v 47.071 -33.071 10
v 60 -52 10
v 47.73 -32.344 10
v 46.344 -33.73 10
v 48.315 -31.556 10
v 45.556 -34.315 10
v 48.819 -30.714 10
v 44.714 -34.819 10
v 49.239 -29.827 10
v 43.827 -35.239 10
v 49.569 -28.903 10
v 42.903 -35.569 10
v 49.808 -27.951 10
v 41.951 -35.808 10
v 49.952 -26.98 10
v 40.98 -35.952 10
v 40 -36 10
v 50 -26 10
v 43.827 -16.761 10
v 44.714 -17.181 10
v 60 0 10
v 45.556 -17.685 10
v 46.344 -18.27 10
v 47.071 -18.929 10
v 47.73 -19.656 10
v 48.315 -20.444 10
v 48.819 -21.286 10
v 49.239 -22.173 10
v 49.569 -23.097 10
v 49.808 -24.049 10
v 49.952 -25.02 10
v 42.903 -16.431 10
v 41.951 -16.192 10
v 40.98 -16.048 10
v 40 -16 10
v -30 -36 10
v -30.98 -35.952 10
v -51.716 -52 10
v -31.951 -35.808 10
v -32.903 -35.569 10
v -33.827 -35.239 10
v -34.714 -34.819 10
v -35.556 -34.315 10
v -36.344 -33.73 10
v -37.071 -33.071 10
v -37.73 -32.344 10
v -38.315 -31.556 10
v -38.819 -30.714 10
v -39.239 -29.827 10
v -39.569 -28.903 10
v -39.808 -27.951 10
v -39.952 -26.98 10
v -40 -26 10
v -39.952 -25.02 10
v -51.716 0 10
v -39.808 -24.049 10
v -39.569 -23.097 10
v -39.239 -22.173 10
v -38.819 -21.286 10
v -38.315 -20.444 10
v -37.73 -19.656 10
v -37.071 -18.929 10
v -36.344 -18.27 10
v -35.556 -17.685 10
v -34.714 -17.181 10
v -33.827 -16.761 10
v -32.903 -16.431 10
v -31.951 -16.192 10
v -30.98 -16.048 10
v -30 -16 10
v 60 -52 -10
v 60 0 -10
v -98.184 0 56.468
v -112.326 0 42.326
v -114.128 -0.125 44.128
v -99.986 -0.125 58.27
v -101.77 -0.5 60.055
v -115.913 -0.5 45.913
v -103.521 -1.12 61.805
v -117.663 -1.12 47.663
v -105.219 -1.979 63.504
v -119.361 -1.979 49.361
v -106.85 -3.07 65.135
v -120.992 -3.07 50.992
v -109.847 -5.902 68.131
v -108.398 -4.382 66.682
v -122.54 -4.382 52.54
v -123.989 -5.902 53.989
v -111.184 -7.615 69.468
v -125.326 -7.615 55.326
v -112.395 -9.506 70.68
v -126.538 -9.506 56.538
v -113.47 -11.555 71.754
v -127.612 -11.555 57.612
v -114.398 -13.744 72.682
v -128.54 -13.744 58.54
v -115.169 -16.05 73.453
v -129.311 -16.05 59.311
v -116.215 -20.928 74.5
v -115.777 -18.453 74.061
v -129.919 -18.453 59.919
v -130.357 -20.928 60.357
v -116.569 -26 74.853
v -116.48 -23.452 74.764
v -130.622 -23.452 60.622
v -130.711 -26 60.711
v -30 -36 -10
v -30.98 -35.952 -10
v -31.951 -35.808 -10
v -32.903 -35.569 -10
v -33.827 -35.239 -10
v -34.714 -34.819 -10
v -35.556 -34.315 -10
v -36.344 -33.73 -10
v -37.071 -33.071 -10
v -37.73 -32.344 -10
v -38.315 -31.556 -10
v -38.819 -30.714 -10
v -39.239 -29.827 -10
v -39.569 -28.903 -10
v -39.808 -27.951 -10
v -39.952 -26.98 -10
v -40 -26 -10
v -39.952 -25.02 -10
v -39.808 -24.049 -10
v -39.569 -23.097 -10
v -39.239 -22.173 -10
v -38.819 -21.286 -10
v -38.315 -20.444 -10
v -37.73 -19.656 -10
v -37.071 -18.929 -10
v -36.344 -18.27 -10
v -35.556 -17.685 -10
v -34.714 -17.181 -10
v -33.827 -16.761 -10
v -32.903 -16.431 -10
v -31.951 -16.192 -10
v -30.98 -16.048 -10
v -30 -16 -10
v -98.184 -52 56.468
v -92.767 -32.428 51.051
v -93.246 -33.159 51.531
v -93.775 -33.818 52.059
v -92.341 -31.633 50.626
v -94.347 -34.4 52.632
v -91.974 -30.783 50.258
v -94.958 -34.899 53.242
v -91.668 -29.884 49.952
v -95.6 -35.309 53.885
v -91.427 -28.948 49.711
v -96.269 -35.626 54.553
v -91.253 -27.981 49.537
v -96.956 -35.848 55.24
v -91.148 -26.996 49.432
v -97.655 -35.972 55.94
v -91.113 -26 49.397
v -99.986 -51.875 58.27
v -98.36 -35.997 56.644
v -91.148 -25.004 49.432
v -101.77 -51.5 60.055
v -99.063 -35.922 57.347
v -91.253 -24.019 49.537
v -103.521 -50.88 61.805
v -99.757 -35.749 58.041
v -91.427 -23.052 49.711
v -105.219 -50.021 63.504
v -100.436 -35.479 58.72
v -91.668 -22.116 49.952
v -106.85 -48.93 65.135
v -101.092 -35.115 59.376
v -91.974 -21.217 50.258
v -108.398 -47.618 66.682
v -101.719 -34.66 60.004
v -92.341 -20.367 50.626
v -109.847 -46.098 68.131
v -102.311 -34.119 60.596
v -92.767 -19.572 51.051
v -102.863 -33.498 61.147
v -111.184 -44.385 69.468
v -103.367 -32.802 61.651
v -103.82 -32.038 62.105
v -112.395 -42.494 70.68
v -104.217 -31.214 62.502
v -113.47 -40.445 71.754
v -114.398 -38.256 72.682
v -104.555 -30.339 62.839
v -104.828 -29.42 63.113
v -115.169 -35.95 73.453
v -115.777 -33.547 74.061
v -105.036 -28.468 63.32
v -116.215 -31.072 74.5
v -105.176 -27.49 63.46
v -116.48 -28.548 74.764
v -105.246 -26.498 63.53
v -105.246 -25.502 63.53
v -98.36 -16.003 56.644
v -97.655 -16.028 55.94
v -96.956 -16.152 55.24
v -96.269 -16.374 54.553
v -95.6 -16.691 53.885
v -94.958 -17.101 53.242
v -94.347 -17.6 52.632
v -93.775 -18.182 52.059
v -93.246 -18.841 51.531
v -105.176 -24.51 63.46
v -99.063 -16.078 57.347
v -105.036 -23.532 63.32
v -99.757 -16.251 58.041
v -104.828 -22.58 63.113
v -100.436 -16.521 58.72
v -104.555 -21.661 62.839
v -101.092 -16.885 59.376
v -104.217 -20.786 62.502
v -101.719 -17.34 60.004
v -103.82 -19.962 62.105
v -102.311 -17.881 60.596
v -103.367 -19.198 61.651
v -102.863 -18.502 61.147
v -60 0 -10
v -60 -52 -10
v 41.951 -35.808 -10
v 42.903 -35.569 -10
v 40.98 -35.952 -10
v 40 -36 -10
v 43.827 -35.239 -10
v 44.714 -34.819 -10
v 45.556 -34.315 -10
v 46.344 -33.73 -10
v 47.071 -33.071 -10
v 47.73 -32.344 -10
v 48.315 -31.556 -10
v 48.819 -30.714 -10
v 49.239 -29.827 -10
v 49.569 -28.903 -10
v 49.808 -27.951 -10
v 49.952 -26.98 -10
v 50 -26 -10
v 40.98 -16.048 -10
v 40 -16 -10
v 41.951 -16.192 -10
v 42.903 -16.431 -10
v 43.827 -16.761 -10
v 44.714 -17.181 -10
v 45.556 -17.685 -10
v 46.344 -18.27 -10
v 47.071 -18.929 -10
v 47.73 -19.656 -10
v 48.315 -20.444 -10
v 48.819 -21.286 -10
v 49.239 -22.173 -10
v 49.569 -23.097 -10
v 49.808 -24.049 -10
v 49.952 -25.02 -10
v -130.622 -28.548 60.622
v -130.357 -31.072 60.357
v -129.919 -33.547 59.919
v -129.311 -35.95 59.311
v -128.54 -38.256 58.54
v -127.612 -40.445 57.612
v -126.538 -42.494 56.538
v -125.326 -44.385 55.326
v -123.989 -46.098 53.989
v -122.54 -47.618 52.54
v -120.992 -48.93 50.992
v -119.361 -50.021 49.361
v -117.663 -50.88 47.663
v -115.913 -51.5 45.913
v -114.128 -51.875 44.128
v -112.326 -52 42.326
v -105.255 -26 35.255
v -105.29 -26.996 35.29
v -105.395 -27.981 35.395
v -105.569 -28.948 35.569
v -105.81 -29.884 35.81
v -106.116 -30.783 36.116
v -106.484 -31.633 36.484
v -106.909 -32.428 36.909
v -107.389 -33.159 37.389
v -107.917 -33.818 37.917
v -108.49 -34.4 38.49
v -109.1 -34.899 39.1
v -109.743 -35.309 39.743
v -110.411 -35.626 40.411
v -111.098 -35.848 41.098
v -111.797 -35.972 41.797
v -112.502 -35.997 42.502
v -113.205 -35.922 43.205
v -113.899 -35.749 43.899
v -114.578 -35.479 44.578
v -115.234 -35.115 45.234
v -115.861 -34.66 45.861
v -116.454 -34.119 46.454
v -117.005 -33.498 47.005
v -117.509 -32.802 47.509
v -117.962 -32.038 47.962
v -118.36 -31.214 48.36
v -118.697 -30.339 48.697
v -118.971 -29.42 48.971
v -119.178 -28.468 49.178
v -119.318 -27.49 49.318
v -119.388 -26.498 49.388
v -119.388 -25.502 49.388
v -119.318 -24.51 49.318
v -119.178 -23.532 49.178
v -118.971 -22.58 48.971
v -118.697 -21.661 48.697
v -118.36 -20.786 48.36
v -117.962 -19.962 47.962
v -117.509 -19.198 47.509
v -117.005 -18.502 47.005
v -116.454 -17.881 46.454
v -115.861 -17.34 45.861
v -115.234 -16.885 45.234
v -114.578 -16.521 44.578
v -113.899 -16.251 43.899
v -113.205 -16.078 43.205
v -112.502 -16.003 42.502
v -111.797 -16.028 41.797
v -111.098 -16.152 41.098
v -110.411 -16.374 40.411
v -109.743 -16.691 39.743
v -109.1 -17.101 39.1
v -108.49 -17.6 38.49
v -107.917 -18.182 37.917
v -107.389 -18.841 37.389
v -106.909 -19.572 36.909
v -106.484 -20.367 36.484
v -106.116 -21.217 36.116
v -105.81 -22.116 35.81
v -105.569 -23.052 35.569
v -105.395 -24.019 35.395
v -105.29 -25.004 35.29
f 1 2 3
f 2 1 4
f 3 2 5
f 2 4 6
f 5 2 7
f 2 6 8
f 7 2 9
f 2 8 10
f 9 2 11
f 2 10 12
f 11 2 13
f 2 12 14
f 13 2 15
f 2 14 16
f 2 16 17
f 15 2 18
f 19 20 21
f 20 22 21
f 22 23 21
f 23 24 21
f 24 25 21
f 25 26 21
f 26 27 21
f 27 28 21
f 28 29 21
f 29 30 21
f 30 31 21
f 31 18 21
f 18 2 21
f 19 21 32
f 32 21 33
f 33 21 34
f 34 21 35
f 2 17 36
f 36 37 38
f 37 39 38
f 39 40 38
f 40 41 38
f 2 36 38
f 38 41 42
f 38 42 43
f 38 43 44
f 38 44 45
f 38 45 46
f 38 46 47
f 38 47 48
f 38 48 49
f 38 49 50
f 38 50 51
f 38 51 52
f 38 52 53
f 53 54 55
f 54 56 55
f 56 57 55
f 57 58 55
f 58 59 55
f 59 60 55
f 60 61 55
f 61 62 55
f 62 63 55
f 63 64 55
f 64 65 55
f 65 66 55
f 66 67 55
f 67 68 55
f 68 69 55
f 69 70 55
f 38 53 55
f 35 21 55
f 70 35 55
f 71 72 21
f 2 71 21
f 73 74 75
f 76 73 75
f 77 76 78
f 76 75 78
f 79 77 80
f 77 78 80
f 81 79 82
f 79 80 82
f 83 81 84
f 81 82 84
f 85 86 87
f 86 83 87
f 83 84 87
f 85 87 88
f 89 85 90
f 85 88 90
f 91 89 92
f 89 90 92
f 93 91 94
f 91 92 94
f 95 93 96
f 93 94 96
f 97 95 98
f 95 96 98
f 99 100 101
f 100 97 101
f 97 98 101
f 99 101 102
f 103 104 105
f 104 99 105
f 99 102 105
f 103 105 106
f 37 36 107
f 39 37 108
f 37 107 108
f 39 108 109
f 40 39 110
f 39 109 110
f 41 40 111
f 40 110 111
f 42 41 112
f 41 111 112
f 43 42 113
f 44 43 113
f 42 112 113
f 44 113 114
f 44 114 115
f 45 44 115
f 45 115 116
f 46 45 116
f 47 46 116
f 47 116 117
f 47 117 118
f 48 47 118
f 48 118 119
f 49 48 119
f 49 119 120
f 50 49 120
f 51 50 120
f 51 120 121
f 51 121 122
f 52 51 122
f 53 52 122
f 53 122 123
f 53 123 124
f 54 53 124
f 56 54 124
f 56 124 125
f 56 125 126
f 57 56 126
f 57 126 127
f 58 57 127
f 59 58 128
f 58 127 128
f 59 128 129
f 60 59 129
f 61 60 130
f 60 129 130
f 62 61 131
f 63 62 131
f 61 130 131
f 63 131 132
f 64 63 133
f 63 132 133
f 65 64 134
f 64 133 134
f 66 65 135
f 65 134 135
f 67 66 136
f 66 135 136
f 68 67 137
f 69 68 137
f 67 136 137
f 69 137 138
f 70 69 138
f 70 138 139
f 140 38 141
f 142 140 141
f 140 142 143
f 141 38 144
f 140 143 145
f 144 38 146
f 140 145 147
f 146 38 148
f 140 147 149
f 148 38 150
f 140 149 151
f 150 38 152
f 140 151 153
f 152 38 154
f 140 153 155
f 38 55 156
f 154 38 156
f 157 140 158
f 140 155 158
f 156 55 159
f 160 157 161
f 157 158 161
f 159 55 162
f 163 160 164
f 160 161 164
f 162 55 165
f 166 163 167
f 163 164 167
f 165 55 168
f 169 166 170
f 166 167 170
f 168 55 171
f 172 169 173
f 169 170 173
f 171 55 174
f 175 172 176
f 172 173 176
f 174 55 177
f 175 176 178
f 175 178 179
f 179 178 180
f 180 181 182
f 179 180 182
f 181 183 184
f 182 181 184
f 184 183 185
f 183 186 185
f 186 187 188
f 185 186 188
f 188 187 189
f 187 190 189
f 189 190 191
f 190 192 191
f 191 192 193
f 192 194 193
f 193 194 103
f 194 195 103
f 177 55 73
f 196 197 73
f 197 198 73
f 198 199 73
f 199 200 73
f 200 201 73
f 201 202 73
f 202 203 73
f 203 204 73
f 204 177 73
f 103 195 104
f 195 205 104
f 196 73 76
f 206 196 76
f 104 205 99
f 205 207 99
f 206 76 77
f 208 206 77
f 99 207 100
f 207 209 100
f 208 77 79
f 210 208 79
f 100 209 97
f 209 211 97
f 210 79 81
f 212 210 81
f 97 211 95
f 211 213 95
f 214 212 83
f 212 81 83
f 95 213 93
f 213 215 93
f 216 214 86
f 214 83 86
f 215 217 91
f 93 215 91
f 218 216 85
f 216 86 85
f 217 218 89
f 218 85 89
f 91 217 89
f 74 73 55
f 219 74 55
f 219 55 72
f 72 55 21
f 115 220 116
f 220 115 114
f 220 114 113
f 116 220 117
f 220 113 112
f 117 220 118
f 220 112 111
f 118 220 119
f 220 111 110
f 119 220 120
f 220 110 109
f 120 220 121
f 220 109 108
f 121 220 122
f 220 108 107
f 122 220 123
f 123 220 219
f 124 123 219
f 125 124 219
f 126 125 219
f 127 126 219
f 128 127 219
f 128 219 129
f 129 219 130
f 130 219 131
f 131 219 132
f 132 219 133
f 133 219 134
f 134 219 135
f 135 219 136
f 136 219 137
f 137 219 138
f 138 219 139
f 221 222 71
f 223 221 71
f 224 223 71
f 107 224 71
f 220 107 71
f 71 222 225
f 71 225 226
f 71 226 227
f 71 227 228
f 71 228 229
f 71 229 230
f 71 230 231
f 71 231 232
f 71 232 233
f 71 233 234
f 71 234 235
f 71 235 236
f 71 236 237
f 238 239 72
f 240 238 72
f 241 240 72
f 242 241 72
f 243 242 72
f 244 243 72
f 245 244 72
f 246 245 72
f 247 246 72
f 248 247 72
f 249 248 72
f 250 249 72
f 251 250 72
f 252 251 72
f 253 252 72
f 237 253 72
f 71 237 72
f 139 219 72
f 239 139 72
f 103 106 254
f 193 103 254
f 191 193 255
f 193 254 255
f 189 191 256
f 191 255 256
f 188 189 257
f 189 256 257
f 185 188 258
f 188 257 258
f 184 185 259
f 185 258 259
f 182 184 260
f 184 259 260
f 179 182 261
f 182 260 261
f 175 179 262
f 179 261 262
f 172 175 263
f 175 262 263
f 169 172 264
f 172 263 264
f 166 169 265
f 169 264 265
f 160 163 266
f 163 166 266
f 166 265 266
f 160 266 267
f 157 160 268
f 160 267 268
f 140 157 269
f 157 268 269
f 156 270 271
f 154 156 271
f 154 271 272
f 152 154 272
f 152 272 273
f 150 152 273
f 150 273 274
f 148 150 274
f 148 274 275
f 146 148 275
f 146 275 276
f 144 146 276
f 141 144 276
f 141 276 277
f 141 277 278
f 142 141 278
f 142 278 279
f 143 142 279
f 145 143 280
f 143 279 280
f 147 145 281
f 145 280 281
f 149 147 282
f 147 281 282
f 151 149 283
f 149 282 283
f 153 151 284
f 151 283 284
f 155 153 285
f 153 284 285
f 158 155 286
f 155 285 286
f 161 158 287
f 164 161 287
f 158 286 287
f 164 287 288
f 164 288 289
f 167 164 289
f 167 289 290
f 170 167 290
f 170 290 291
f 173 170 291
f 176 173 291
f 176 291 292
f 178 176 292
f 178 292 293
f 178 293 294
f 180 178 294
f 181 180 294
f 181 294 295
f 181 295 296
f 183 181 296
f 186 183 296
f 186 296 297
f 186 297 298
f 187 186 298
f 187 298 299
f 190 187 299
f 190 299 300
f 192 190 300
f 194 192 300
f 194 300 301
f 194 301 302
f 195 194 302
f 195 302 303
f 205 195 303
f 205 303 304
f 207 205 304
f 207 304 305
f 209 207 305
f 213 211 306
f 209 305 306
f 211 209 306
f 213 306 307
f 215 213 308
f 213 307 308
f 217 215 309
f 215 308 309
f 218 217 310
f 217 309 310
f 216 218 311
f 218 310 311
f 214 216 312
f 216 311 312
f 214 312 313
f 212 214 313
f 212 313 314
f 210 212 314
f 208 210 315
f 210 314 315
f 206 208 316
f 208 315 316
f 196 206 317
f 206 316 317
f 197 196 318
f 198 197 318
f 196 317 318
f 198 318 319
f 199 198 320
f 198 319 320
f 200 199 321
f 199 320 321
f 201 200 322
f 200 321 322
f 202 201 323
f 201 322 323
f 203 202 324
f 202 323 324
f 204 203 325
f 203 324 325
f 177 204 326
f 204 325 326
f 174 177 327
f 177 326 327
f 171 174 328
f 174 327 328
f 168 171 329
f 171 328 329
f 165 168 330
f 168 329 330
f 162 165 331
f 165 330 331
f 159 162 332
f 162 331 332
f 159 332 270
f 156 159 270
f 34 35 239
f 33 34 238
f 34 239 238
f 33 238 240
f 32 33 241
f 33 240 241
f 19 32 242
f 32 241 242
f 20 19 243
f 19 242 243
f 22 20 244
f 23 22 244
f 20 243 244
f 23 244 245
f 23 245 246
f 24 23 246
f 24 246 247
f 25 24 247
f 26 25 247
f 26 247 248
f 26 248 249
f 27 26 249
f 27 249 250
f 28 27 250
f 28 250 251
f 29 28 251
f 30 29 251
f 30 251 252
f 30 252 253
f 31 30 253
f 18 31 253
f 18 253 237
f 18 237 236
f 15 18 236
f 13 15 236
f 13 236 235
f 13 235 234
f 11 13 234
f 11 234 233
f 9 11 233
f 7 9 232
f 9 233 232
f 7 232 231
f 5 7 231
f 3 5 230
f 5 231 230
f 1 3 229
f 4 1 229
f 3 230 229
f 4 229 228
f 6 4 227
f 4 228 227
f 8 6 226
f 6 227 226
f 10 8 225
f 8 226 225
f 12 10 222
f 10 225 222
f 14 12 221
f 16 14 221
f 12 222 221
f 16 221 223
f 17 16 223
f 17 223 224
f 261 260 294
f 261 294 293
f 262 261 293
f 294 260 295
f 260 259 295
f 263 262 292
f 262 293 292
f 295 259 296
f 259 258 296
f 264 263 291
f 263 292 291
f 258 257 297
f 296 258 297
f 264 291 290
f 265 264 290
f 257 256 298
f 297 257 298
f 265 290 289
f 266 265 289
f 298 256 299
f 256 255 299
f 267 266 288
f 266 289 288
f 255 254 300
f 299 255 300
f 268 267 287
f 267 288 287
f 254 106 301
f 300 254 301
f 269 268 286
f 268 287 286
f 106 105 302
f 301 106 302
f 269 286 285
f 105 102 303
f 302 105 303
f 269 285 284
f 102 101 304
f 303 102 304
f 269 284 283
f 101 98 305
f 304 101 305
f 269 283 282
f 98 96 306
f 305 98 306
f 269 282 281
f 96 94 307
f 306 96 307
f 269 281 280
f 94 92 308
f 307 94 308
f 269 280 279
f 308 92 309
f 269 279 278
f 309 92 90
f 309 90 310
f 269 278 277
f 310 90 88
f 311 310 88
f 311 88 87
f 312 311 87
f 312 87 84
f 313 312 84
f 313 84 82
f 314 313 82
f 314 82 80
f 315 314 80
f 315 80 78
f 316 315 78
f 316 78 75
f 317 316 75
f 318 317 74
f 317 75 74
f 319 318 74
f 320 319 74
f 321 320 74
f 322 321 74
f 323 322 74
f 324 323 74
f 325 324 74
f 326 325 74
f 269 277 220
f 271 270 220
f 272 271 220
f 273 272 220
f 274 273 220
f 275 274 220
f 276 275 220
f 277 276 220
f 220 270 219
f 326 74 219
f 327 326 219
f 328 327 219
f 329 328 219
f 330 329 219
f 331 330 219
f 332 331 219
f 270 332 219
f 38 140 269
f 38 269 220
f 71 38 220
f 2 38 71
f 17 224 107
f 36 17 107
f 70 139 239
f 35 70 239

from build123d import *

# Parameters (mm, degrees)
F1_DEPTH = 52
F2_R     = 10
F3_DEPTH = 144.8538137424
F5_DEPTH = 84.8538137424


with BuildPart() as f1:
    # F0 (on Front) → F1 (new body)
    with BuildSketch(Plane.XZ):
        Polygon((-130.7106781187, 60.7106781187), (-60, -10), (-60, 10), (-51.7157287525, 10), (-116.5685424949, 74.8528137424), align=None)
        Polygon((-60, -10), (60, -10), (60, 10), (-51.7157287525, 10), (-60, 10), align=None)
    extrude(amount=F1_DEPTH)

    # F2 (on face) → F3 (cut, through all)
    with BuildSketch(Plane(origin=(-35, 0, -35), x_dir=(0.7071067812, 0, -0.7071067812), z_dir=(-0.7071067812, 0, -0.7071067812))):
        with Locations((-109.3553390593, 26)):
            Circle(F2_R)
        with BuildLine():
            ThreePointArc((-135.3553390593, 26), (-127.7401153702, 44.3847763109), (-109.3553390593, 52))
            Line((-109.3553390593, 52), (-135.3553390593, 52))
            Line((-135.3553390593, 52), (-135.3553390593, 26))
        make_face()
        with BuildLine():
            Line((-135.3553390593, 0), (-109.3553390593, 0))
            ThreePointArc((-109.3553390593, 0), (-127.7401153702, 7.6152236891), (-135.3553390593, 26))
            Line((-135.3553390593, 26), (-135.3553390593, 0))
        make_face()
    extrude(amount=-F3_DEPTH, mode=Mode.SUBTRACT)

    # F4 (on face) → F5 (cut, through all)
    with BuildSketch(Plane(origin=(0, 0, -10), x_dir=(1, 0, 0), z_dir=(0, 0, -1))):
        with BuildLine():
            ThreePointArc((40, 16), (50, 26), (40, 36))
            Line((40, 36), (-30, 36))
            ThreePointArc((-30, 36), (-40, 26), (-30, 16))
            Line((-30, 16), (40, 16))
        make_face()
    extrude(amount=-F5_DEPTH, mode=Mode.SUBTRACT)


solid = f1.part
